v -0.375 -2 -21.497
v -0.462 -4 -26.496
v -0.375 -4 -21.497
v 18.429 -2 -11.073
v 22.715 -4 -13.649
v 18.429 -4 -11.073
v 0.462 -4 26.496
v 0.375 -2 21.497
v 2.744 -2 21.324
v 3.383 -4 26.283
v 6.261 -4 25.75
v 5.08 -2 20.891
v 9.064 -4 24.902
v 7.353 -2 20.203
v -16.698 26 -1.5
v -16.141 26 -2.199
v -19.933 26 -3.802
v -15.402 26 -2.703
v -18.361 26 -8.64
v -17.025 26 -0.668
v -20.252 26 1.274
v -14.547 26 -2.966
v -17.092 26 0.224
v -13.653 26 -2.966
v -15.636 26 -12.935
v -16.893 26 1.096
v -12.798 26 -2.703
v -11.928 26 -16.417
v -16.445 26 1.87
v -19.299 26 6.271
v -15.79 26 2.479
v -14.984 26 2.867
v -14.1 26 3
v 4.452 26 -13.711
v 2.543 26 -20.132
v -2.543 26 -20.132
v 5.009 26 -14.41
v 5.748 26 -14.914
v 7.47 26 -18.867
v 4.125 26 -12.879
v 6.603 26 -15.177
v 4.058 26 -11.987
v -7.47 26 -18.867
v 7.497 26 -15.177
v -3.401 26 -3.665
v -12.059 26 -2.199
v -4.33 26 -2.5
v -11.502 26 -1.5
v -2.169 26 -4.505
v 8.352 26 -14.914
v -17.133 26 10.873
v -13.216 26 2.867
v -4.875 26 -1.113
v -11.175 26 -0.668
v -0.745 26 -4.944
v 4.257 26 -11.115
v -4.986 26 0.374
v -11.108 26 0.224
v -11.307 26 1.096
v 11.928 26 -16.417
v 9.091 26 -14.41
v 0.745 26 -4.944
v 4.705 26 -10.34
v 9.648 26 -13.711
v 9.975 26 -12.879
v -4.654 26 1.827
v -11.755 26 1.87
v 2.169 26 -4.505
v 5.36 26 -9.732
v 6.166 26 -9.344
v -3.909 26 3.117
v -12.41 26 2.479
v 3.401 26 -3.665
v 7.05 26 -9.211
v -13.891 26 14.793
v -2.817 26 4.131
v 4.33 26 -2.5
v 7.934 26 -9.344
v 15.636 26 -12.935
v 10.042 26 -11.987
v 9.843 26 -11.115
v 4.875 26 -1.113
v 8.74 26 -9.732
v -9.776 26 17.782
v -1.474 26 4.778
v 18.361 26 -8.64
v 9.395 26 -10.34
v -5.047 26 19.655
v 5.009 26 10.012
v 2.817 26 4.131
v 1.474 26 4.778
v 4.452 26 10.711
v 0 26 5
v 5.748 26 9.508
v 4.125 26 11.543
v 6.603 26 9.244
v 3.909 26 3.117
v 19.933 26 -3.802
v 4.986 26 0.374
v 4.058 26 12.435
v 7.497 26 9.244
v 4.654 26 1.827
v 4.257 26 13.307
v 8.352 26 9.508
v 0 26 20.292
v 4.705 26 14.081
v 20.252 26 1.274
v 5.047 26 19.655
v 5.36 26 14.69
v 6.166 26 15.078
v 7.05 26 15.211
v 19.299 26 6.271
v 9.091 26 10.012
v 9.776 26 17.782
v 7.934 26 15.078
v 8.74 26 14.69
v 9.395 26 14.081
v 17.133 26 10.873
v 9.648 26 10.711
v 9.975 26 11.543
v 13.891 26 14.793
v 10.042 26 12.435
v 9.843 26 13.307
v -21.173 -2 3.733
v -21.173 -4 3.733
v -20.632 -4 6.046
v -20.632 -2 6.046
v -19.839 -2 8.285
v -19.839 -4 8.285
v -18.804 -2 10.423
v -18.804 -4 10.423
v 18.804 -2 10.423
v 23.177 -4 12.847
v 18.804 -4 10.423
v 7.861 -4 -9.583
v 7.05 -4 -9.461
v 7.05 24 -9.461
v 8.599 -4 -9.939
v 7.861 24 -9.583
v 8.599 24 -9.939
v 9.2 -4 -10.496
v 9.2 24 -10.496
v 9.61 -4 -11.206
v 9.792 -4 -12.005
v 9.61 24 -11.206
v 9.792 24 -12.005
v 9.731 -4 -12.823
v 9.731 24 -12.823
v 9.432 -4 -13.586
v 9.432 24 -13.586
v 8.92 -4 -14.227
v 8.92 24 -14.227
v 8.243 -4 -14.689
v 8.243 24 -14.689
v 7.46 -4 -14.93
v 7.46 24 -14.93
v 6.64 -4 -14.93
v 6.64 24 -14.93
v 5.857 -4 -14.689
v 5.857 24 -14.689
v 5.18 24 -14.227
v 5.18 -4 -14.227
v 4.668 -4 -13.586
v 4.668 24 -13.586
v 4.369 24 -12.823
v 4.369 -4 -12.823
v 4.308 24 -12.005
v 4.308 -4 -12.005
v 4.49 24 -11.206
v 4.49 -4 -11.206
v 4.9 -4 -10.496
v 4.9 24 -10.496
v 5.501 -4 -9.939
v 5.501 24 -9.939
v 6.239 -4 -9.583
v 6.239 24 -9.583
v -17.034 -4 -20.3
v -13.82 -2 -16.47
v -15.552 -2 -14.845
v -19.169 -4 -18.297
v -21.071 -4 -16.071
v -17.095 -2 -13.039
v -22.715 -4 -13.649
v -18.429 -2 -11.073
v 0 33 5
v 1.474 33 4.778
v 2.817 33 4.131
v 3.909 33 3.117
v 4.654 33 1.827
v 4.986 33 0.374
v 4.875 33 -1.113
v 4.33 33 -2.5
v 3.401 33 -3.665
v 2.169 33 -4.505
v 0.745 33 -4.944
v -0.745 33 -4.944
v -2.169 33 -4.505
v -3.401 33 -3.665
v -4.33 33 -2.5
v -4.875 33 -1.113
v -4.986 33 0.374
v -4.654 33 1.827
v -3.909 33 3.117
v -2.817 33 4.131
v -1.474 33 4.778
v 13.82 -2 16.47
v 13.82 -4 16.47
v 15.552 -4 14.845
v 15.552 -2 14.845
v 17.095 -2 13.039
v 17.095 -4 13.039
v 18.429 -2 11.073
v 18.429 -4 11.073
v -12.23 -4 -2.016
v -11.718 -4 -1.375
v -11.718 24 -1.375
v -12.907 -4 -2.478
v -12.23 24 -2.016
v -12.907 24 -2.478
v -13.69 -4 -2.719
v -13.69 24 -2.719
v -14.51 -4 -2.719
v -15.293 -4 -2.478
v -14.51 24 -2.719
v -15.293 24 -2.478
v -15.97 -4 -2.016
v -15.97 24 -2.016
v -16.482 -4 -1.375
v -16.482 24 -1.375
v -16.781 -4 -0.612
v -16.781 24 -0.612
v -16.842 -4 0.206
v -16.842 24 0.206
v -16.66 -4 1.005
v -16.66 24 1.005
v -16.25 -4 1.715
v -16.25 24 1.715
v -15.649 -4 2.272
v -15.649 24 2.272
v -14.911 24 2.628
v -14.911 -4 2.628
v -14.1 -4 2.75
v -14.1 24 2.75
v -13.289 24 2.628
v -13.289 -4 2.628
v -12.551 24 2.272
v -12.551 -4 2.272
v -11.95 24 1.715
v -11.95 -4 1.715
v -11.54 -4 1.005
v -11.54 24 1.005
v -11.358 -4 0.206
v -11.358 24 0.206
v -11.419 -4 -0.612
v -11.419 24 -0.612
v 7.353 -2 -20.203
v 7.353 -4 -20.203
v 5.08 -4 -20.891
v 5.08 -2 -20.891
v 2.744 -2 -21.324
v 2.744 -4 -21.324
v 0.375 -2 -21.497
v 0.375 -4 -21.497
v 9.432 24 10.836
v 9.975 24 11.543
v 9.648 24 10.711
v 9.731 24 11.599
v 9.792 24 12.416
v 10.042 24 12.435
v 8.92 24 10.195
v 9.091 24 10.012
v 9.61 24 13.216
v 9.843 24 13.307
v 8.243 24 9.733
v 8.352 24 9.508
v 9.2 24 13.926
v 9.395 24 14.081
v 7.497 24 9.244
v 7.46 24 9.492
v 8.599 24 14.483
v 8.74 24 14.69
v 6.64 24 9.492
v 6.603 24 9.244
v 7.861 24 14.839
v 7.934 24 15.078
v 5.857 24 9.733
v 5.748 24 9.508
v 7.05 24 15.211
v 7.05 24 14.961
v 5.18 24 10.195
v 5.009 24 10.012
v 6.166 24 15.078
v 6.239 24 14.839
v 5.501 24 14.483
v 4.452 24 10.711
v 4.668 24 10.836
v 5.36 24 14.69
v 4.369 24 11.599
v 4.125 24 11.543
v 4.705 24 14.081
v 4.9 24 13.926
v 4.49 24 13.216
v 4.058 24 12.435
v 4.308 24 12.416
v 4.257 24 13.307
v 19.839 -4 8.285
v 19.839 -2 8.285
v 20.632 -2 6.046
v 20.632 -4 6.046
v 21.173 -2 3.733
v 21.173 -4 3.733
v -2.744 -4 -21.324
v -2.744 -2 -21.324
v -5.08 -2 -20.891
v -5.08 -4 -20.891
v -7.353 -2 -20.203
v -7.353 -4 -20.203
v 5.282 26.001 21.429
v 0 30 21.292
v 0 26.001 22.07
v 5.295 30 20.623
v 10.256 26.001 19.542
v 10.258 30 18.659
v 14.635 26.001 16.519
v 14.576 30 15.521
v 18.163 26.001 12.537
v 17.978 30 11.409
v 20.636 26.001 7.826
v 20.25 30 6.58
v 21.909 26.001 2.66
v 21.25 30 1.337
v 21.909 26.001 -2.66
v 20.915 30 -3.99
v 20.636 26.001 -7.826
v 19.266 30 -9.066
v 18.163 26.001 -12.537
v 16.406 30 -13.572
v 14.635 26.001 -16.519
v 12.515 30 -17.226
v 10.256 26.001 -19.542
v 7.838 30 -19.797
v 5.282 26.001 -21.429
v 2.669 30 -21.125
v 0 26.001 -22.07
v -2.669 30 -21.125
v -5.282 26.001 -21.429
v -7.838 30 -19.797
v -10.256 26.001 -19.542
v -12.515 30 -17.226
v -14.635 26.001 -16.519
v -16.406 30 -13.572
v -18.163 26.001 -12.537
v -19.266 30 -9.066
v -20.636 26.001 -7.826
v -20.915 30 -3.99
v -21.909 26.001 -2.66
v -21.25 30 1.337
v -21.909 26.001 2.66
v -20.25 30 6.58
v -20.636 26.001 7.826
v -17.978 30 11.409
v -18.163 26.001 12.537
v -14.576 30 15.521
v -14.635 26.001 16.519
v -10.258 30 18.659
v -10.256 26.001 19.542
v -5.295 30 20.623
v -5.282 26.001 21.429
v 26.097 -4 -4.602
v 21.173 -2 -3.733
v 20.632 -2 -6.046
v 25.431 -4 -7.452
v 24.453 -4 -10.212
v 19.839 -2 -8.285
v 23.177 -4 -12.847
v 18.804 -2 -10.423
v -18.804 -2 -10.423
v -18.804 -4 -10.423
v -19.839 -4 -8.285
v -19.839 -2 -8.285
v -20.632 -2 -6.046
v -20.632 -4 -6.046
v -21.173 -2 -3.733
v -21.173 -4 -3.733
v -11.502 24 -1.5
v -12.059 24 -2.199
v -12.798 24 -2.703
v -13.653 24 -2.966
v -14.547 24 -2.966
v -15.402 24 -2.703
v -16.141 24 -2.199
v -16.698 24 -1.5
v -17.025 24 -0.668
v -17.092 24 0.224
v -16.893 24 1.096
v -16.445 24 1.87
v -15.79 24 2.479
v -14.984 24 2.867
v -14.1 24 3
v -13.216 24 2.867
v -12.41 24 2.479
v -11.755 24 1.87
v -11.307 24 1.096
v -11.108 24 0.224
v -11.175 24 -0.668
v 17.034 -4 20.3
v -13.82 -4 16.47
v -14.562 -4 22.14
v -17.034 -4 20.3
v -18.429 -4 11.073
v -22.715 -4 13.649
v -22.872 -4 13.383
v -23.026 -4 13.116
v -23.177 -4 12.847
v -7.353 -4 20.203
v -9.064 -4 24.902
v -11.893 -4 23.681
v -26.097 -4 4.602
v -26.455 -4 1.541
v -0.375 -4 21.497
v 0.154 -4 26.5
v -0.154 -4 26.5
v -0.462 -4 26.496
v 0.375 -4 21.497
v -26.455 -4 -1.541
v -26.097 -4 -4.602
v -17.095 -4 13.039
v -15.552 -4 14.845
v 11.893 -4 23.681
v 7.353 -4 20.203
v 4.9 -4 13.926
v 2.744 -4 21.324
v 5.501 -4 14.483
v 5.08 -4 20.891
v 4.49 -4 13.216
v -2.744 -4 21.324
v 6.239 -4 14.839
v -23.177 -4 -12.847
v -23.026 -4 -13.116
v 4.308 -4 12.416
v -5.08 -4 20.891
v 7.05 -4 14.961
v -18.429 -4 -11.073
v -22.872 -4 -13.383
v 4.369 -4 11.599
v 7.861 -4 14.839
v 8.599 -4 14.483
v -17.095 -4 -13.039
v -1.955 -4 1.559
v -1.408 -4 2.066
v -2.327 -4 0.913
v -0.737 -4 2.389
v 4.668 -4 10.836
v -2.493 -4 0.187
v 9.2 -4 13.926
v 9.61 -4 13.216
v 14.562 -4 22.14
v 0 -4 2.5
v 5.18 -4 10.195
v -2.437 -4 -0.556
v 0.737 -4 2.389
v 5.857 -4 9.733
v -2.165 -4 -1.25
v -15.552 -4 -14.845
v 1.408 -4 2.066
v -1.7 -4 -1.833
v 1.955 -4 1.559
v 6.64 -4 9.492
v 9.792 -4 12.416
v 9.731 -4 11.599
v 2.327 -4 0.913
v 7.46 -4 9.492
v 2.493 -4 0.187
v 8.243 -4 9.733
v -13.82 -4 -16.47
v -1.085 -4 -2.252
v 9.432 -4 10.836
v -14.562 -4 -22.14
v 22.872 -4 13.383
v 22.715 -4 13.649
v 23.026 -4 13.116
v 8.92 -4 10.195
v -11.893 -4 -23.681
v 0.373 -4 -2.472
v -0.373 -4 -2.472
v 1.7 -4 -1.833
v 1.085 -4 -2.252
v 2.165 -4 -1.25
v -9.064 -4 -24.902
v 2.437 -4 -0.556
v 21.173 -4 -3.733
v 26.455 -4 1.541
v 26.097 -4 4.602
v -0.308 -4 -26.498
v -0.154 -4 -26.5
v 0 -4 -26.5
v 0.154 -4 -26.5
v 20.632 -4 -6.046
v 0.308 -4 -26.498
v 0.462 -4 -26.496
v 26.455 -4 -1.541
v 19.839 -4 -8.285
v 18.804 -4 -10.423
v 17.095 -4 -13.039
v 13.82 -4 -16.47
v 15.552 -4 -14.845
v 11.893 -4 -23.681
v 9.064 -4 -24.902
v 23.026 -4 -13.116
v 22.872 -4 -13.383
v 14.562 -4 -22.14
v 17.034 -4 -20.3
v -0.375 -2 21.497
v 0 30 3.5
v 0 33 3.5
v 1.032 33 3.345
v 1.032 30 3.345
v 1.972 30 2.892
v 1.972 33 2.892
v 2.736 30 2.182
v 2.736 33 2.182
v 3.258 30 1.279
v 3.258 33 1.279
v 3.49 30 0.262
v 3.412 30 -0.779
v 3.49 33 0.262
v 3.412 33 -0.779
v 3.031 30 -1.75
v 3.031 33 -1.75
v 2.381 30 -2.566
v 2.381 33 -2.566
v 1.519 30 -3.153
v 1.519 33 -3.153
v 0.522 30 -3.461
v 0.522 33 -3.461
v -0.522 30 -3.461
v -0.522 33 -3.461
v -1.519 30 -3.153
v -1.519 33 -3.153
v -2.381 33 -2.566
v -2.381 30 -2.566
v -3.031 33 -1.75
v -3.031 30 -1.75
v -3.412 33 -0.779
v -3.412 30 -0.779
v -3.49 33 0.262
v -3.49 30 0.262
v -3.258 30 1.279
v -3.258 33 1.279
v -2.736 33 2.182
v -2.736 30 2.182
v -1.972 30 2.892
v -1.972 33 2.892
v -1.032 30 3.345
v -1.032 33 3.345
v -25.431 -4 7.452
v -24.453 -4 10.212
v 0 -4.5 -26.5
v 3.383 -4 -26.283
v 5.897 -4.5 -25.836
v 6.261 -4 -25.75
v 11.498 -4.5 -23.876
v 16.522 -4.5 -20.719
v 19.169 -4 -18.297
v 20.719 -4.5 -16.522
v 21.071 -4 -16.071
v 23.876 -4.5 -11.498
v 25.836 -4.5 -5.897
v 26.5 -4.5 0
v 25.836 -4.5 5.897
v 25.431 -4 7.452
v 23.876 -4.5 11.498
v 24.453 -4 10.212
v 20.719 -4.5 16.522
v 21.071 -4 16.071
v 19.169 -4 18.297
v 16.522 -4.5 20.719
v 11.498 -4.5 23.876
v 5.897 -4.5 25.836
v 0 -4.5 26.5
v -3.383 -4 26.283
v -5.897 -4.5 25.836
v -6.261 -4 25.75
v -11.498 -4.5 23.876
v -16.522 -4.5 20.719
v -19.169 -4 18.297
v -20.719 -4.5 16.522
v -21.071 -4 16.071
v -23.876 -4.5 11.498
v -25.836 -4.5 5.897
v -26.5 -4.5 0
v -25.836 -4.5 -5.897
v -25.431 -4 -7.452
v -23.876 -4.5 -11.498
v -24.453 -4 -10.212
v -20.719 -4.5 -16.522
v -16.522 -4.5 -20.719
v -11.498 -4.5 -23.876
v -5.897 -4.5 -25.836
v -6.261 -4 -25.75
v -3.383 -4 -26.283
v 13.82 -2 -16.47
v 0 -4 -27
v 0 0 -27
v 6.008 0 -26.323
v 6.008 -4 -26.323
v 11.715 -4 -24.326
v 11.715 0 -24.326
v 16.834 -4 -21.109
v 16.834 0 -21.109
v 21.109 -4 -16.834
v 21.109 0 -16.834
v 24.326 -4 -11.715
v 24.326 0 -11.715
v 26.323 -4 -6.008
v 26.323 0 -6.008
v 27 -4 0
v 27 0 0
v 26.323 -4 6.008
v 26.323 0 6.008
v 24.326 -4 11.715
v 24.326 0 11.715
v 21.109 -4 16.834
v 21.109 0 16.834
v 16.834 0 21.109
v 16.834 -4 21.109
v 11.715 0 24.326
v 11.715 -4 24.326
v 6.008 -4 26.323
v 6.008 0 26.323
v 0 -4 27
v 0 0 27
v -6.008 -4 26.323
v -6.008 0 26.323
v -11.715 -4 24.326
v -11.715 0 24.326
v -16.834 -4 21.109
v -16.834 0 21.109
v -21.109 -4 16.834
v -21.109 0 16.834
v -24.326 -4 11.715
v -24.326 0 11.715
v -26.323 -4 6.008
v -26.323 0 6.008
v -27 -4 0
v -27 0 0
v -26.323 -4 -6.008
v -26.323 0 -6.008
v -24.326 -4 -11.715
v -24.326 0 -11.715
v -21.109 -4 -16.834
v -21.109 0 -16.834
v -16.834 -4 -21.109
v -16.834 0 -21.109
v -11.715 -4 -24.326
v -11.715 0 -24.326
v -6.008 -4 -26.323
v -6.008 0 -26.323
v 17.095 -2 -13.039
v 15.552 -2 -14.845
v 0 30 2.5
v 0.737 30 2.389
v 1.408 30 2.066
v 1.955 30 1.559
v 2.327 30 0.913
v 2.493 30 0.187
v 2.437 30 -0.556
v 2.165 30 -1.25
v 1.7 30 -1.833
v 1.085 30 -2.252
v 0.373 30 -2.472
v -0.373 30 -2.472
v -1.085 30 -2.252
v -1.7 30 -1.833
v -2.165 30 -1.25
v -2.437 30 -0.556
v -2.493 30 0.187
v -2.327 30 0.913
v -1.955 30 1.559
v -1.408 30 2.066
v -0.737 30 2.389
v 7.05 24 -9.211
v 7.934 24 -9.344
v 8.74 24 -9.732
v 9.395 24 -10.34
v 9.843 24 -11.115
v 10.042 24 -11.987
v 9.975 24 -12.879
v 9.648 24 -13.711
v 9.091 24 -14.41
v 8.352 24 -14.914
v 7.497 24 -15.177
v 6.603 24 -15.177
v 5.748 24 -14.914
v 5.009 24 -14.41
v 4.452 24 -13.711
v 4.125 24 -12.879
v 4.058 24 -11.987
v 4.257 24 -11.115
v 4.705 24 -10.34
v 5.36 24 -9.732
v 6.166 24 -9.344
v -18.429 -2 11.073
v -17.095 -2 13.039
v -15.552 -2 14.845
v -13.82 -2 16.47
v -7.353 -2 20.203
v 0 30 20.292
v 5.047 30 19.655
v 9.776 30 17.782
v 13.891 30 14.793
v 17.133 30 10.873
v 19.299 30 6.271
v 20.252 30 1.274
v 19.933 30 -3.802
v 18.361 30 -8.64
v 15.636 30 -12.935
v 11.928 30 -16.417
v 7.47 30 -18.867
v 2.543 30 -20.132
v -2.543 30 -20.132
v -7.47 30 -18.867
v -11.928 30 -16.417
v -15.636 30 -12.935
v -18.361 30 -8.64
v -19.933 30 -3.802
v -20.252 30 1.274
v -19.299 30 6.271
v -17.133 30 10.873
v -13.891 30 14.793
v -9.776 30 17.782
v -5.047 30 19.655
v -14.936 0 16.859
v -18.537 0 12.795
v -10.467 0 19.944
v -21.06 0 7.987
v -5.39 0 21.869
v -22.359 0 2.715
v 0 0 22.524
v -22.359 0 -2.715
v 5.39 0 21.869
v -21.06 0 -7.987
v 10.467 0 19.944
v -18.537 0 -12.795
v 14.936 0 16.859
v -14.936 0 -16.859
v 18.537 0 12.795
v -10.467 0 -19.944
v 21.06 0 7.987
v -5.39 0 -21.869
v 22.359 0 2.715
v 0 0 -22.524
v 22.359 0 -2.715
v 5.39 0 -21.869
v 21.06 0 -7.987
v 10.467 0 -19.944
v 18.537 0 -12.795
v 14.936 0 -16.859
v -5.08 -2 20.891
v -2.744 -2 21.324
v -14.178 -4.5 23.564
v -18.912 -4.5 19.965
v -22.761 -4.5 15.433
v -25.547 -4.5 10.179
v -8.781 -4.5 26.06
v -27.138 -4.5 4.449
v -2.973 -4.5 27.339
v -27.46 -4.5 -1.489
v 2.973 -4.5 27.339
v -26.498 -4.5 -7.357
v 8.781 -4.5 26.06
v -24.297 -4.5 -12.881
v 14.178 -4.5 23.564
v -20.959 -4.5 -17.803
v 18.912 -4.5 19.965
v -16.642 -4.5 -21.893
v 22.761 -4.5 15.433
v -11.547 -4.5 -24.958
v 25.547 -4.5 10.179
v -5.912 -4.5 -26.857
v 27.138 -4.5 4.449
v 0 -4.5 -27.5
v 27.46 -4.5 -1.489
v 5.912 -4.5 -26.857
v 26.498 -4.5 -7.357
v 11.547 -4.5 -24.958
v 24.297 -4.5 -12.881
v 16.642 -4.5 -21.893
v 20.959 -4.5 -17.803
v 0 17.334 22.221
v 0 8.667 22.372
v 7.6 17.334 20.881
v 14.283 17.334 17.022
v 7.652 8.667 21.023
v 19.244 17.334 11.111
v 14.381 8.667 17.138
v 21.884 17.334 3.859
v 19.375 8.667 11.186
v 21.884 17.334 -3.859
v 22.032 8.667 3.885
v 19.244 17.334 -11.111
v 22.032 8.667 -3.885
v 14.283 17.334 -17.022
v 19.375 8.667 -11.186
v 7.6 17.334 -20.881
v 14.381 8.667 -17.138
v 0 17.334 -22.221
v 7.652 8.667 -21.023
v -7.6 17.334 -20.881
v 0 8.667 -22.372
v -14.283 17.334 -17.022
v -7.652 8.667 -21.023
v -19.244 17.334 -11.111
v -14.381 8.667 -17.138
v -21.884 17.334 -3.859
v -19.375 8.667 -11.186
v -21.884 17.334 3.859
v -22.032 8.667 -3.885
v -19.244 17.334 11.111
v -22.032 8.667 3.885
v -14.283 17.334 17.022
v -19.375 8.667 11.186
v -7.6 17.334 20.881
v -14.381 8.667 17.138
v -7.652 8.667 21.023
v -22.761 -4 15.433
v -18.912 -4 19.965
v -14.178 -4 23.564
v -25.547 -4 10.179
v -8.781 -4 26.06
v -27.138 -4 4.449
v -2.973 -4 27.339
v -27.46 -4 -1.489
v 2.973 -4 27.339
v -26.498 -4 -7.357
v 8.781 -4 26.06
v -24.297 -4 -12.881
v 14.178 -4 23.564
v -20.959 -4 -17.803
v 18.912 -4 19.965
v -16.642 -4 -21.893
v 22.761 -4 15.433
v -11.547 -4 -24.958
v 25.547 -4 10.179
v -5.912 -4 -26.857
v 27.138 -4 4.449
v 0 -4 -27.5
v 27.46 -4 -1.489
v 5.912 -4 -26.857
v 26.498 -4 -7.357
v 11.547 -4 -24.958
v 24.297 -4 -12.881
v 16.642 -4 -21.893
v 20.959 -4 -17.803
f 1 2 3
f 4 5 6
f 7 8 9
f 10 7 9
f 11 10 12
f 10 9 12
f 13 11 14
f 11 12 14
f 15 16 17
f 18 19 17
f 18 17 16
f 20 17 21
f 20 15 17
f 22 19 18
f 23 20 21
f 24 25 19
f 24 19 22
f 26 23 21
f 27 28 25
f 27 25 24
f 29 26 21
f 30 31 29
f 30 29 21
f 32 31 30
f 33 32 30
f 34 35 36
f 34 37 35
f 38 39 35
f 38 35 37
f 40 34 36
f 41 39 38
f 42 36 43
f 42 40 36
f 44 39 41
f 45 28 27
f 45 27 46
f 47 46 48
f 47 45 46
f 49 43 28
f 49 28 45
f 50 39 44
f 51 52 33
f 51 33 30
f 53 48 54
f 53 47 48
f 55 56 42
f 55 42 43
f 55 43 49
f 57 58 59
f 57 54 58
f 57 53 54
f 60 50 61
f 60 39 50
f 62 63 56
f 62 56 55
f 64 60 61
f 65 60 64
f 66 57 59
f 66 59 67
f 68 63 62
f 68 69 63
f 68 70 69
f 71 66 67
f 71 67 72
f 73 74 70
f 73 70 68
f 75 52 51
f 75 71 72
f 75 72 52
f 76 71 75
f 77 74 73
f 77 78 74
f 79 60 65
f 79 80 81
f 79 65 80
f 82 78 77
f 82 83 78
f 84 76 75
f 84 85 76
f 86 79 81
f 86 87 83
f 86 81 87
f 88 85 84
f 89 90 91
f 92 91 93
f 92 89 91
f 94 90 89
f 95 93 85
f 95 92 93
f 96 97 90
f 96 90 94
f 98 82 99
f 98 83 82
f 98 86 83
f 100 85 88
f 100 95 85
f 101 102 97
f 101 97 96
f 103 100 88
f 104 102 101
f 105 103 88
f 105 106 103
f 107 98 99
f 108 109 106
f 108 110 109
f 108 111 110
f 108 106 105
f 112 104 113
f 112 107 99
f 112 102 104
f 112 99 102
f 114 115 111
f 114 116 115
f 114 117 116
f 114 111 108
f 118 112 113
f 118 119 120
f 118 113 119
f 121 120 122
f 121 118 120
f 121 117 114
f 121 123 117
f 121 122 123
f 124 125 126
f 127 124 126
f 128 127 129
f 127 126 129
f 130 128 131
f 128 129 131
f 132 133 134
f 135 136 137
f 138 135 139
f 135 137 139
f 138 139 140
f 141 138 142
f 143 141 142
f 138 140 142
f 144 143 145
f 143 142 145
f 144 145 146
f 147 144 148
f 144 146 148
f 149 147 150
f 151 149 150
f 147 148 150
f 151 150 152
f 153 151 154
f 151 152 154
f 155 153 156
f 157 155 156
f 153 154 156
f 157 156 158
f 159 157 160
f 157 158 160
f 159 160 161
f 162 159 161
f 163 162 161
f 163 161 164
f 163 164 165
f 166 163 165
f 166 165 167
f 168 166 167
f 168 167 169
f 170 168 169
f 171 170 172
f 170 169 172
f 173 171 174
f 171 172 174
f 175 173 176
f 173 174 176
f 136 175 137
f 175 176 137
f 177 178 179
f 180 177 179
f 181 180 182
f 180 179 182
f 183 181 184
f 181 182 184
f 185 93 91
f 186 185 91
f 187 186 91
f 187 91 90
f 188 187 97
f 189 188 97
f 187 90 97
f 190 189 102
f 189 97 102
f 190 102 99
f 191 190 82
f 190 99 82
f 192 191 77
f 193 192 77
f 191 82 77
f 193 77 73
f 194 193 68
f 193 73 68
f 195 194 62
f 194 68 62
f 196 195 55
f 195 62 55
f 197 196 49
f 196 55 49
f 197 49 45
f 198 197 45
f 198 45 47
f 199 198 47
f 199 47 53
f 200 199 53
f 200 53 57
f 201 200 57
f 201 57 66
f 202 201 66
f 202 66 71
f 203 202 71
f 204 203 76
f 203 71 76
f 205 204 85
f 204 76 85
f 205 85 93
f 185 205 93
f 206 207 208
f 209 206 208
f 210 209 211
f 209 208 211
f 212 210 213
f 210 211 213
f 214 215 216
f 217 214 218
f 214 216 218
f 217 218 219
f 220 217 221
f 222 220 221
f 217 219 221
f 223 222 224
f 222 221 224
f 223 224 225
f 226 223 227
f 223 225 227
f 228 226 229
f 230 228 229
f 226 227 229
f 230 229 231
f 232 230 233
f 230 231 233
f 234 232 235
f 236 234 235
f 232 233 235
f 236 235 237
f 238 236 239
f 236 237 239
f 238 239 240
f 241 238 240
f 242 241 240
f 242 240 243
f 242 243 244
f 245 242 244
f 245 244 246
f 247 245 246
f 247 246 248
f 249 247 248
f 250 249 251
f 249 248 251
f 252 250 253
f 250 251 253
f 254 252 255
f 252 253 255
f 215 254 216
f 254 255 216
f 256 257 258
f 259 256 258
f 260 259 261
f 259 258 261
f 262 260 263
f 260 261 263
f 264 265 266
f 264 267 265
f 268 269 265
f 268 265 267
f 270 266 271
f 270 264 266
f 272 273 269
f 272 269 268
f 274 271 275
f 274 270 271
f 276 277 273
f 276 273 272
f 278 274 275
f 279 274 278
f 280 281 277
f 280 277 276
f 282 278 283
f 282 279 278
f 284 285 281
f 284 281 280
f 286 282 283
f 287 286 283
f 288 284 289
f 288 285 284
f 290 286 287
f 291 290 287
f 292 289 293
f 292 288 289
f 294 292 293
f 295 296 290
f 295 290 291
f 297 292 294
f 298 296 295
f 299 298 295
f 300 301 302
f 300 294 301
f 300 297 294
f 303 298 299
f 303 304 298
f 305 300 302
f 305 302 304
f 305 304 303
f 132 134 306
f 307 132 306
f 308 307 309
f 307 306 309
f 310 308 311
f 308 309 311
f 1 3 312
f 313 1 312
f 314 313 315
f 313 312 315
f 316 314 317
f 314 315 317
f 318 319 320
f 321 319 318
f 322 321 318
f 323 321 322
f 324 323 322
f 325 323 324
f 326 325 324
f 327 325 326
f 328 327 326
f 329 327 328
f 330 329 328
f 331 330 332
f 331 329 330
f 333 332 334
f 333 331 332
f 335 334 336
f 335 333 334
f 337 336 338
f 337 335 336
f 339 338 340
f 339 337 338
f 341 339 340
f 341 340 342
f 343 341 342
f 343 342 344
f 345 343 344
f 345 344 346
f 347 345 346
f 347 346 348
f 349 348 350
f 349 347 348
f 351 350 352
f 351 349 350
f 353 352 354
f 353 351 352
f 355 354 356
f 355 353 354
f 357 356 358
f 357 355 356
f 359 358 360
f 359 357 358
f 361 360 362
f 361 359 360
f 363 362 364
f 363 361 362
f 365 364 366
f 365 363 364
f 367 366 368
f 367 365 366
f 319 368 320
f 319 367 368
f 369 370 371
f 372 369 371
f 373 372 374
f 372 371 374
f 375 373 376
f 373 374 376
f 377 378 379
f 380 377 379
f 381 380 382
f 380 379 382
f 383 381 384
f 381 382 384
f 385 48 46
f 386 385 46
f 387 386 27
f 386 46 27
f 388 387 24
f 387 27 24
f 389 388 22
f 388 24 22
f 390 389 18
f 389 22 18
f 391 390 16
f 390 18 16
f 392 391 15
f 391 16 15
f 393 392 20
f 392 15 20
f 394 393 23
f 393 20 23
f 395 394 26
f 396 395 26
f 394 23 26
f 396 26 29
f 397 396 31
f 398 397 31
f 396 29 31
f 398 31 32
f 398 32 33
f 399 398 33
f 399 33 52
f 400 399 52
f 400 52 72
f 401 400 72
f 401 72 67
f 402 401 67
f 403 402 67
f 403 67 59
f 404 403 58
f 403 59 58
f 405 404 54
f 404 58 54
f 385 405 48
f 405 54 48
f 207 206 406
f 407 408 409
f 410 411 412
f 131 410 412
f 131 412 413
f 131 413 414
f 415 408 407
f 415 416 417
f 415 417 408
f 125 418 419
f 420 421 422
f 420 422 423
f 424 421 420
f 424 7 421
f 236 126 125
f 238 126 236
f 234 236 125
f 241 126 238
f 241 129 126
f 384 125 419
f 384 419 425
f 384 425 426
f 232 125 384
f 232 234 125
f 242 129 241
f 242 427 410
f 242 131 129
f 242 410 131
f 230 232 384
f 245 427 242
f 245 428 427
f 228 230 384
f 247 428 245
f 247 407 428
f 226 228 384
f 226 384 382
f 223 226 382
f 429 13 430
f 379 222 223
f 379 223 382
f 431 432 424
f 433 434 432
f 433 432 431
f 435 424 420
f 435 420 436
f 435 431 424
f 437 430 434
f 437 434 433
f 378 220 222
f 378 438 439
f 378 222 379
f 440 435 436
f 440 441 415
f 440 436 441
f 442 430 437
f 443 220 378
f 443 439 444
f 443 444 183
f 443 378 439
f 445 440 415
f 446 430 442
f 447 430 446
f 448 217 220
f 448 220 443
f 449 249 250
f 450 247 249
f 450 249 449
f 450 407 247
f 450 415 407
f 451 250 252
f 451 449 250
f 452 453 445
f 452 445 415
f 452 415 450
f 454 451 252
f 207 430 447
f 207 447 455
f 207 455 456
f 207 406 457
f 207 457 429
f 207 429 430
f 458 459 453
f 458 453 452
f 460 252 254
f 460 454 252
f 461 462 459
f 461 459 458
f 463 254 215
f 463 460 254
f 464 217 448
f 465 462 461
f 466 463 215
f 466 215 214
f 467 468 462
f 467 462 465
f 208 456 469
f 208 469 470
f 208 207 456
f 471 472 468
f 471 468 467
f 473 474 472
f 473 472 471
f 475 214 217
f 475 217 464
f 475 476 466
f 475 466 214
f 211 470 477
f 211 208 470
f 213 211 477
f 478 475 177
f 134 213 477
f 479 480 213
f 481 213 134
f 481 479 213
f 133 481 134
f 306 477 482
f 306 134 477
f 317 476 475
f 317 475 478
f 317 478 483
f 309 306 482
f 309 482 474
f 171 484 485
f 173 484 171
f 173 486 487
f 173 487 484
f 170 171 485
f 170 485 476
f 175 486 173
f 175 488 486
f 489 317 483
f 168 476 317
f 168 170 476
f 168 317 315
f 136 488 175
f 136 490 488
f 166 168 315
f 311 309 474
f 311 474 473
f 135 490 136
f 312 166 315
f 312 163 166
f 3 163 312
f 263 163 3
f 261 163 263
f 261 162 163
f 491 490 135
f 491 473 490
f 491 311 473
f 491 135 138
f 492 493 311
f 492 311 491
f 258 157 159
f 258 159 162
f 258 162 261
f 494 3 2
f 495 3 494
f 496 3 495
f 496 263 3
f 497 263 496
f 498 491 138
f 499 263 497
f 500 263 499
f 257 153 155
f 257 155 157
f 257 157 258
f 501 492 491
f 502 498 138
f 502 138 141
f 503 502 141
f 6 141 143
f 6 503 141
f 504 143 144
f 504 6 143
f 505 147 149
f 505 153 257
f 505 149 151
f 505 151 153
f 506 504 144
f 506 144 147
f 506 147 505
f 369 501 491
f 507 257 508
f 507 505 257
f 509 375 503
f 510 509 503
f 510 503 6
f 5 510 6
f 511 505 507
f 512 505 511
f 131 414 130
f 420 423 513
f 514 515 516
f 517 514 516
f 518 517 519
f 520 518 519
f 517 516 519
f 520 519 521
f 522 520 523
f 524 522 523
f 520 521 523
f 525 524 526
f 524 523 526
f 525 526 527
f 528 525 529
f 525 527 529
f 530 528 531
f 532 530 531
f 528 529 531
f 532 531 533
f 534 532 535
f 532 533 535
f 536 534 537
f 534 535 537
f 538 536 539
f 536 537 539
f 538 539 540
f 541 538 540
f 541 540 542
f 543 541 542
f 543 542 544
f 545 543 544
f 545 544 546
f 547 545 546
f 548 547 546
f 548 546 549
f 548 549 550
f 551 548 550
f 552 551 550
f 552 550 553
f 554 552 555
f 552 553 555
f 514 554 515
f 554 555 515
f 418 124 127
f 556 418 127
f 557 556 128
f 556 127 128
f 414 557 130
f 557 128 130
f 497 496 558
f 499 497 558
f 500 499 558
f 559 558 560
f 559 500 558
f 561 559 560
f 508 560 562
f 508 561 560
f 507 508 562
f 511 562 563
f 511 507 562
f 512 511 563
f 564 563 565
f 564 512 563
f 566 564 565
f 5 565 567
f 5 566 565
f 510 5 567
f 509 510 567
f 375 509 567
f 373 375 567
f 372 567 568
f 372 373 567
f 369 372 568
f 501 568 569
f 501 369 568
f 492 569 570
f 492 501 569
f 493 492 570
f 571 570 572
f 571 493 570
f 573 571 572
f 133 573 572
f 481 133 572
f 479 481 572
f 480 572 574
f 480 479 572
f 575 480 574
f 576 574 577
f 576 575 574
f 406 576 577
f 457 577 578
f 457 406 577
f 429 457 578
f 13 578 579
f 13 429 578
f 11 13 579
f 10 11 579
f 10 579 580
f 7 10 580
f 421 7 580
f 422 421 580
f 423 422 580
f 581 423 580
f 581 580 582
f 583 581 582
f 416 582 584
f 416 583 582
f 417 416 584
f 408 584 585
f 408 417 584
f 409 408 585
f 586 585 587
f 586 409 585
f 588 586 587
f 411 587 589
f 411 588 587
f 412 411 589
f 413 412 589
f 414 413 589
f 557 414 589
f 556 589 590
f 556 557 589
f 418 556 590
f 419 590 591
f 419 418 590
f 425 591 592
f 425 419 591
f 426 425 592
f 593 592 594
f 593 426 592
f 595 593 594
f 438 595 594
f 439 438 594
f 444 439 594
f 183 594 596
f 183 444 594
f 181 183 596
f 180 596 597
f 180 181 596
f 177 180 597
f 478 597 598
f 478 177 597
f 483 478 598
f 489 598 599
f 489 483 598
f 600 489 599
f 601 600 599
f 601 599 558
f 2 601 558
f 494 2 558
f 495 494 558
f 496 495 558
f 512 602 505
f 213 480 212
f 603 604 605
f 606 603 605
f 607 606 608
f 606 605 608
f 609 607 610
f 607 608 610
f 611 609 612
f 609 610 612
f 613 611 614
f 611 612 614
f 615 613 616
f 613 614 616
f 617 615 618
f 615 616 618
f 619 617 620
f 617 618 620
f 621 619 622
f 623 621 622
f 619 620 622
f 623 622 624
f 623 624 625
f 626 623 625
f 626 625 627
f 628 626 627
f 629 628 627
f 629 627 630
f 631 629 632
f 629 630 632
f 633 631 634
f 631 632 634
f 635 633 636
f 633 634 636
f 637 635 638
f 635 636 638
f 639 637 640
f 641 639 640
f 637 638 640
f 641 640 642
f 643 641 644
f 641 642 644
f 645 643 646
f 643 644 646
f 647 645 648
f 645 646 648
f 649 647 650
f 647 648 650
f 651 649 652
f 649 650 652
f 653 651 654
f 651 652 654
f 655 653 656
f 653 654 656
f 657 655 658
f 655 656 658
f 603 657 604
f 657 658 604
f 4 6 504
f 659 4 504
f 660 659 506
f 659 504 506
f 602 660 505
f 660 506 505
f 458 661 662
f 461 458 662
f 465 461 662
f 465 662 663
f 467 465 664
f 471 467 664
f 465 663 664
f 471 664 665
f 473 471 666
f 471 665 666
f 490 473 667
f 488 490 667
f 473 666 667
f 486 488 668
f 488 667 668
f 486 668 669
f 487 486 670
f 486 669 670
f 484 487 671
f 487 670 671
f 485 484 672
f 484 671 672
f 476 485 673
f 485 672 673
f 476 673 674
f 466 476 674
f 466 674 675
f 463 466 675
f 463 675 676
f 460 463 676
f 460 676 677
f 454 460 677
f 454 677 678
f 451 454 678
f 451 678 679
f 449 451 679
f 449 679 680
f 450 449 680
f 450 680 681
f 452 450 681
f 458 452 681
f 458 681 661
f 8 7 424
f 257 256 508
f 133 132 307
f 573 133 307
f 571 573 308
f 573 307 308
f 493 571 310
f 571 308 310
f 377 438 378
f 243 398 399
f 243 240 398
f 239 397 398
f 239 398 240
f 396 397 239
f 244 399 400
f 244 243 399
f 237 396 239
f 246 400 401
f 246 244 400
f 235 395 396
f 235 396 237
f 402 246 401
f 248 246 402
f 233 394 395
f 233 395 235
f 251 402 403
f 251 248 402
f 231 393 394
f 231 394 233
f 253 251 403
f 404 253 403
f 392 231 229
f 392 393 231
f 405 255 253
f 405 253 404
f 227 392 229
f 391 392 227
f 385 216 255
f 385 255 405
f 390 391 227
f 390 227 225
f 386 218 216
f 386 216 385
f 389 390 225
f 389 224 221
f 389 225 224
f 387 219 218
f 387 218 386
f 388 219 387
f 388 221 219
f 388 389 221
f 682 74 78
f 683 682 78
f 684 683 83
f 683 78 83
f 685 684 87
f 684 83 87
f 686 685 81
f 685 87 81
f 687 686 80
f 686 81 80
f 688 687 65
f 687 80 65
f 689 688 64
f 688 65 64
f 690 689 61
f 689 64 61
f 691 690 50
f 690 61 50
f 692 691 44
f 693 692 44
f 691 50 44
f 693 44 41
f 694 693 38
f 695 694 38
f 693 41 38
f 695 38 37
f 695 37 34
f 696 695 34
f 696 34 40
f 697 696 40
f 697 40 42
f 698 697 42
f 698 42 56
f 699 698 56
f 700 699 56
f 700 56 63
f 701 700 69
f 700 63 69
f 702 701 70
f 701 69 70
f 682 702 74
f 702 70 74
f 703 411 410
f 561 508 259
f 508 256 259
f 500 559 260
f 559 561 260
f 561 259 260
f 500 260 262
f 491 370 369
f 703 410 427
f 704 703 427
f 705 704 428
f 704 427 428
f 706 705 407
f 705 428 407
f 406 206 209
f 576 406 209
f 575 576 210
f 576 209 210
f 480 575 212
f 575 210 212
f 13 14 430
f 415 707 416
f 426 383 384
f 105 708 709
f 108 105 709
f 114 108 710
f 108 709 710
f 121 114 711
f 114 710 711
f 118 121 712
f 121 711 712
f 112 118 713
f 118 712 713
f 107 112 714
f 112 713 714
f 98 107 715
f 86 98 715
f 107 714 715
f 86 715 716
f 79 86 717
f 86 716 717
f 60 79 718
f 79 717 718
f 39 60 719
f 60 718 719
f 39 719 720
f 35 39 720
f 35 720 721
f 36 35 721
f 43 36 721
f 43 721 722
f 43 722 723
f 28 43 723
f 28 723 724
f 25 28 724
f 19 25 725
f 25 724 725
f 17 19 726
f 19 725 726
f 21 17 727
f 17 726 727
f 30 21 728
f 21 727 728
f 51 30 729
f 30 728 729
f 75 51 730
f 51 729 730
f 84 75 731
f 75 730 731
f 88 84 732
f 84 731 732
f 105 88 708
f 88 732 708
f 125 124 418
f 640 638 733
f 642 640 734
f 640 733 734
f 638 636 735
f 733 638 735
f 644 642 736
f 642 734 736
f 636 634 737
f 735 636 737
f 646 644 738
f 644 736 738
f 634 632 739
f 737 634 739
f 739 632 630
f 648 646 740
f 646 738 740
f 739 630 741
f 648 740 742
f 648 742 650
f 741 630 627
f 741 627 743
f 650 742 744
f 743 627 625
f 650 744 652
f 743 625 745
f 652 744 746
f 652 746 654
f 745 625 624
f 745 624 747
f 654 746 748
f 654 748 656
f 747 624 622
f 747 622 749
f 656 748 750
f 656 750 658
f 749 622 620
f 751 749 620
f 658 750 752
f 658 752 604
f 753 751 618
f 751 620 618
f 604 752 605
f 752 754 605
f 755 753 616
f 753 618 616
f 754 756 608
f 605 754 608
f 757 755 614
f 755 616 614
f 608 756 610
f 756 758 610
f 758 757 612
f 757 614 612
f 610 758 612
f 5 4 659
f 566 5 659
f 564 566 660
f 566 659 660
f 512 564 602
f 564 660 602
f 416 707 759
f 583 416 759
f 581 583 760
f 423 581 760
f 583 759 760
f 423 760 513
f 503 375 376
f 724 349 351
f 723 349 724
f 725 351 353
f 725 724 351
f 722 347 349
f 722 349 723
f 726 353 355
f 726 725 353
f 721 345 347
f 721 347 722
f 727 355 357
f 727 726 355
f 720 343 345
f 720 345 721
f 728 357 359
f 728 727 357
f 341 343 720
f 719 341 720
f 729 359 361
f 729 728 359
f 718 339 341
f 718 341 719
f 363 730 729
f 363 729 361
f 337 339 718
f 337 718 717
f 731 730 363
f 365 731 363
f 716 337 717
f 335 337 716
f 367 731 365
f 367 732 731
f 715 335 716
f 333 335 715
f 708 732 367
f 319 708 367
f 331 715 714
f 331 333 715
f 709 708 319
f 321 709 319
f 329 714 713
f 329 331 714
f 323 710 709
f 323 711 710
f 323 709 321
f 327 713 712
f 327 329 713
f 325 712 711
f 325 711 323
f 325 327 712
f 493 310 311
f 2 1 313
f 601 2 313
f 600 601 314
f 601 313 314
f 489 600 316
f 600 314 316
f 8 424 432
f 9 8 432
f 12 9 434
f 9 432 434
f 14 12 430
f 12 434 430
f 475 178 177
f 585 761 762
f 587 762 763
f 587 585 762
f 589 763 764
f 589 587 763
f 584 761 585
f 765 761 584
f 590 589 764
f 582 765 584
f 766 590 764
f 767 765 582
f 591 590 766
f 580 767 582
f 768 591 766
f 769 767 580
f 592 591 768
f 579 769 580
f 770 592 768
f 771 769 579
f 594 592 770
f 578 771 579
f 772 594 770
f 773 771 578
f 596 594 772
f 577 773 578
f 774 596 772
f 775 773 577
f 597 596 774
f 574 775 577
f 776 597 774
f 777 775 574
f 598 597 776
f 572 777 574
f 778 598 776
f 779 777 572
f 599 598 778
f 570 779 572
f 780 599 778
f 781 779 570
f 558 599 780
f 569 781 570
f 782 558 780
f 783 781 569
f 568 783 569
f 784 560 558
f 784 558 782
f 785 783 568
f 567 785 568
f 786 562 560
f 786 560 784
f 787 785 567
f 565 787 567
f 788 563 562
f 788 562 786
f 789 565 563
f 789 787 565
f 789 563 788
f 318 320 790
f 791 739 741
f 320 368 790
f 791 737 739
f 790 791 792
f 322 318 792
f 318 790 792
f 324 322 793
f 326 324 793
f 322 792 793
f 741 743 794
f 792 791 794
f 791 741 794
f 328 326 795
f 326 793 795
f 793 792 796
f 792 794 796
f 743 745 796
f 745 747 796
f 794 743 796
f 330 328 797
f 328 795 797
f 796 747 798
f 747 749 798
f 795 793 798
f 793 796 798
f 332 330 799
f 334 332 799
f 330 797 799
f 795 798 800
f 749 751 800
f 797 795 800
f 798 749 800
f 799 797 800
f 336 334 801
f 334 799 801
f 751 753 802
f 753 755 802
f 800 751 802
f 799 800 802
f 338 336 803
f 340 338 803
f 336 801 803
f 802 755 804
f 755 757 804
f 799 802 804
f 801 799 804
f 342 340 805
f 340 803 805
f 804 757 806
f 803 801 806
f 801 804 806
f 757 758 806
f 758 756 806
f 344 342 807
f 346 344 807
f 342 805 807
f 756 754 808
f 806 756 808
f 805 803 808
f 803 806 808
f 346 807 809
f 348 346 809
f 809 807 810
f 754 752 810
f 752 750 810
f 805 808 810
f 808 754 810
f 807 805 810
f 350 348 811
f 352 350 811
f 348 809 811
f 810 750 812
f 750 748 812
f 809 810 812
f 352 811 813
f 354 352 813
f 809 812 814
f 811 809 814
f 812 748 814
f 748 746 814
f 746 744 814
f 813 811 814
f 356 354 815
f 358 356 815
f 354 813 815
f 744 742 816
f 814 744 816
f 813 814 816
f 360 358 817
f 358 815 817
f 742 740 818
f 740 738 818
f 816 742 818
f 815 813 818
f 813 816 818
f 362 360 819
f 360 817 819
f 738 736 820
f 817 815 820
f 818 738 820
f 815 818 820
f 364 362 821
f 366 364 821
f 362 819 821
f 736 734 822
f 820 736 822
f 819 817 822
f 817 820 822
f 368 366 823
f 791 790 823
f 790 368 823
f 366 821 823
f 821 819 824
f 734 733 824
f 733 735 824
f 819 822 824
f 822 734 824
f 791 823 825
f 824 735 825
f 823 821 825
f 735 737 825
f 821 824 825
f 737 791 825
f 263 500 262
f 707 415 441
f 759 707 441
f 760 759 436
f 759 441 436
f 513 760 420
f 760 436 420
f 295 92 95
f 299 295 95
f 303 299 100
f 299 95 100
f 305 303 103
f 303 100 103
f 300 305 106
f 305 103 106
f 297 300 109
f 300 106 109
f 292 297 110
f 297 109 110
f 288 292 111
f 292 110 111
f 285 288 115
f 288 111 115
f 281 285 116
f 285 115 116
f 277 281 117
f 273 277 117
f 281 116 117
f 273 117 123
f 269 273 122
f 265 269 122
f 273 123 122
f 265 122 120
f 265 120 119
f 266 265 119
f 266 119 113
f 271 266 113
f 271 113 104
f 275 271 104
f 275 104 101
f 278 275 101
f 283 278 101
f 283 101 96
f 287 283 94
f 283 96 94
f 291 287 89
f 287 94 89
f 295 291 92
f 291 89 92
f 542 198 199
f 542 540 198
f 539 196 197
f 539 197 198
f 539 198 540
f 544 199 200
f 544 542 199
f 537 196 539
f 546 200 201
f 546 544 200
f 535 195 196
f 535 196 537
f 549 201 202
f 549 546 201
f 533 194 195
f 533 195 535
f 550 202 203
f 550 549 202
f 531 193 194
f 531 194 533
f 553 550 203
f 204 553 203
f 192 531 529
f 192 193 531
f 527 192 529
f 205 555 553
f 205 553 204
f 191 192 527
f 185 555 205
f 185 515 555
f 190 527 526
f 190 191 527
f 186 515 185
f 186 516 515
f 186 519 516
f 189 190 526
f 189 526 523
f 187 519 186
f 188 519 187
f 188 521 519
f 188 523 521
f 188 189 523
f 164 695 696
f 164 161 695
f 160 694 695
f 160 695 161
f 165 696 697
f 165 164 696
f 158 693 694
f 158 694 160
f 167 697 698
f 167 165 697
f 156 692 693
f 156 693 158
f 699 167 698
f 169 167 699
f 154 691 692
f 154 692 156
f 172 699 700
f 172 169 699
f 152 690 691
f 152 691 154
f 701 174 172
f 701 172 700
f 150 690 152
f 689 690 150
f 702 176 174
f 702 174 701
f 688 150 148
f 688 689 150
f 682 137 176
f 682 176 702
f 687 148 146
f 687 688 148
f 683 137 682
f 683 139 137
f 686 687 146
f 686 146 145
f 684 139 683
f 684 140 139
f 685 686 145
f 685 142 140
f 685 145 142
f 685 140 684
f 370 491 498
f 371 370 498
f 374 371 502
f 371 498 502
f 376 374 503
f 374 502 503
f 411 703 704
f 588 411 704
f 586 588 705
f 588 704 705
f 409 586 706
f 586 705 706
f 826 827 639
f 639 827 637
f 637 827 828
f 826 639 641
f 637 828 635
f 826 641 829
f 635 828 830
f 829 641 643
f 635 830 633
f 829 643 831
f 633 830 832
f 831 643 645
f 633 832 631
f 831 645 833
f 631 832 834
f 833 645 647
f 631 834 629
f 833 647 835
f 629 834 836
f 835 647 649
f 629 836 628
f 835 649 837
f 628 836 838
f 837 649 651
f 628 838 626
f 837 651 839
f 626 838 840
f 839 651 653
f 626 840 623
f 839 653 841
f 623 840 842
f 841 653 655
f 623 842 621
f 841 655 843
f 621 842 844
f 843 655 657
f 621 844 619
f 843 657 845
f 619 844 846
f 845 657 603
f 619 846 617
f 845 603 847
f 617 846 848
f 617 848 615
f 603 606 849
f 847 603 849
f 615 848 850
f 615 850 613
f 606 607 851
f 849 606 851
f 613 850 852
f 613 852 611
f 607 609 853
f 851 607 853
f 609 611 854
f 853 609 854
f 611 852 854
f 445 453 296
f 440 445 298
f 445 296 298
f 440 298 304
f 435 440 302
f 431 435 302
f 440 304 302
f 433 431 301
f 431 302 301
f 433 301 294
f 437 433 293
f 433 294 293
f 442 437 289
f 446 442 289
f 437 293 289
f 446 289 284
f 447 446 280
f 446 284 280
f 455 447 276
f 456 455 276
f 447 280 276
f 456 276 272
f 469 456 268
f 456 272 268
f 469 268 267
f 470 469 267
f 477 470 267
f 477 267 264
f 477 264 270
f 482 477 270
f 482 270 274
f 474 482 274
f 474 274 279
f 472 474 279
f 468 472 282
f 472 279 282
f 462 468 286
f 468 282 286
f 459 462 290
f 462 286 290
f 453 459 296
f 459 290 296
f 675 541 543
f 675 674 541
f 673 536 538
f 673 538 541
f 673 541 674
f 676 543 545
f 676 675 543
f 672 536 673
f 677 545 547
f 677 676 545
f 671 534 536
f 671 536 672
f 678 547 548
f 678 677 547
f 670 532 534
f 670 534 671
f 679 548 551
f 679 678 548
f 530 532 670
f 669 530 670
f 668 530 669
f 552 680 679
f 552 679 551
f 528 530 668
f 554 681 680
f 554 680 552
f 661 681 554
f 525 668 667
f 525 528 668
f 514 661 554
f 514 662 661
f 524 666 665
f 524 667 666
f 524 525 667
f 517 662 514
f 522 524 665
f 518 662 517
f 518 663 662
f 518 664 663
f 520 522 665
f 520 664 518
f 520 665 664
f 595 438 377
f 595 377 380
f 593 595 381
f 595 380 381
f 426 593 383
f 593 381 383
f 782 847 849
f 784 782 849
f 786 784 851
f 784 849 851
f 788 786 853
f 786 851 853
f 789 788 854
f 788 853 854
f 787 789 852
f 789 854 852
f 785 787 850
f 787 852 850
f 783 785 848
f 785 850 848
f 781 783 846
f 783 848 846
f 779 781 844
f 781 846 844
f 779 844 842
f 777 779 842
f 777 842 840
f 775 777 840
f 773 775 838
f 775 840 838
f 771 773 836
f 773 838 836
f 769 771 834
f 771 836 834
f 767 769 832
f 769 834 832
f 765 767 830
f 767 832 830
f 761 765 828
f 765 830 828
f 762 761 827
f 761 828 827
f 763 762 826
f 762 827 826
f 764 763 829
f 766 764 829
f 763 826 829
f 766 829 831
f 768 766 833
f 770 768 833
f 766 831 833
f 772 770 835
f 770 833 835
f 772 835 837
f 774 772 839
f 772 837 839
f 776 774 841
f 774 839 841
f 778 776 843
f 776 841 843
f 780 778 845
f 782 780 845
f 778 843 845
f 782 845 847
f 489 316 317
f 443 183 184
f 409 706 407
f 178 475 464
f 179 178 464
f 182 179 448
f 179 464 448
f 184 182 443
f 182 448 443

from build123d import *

# Parameters (mm, degrees)
SCHIZZO1_R                    = 22
ESTRUSIONE_ESTRUSIONE1_DEPTH  = 30
SFORMO1_ANGLE                 = 1
SMUSSO1_SIZE                  = 4
SMUSSO1_SIZE2                 = 0.707593191
SCHIZZO2_R                    = 20.292406809
TAGLIO_ESTRUSIONE1_DEPTH      = 4
SCHIZZO4_R                    = 3
TAGLIO_ESTRUSIONE2_DEPTH      = 2
SCHIZZO3_R                    = 5
ESTRUSIONE_ESTRUSIONE2_DEPTH  = 7
SCHIZZO6_R                    = 3.5
TAGLIO_ESTRUSIONE5_DEPTH      = 3
SCHIZZO14_R                   = 27
SCHIZZO14_R_2                 = 22.5
ESTRUSIONE_ESTRUSIONE8_DEPTH  = 4
SCHIZZO16_R                   = 27.5
SCHIZZO16_R_2                 = 26.5
ESTRUSIONE_ESTRUSIONE9_DEPTH  = 0.5
SCHIZZO21_R                   = 22.5
ESTRUSIONE_ESTRUSIONE12_DEPTH = 4
SCHIZZO5_R                    = 2.75
TAGLIO_ESTRUSIONE3_DEPTH      = 49.215661356
RIPETIZIONECIRCOLARE1_COUNT   = 3
SCHIZZO24_R                   = 2.5
TAGLIO_ESTRUSIONE11_DEPTH     = 52.98797938
TAGLIA_RIVOLUZIONE1_ANGLE     = 40
RIVOLUZIONE1_ANGLE            = 2
RIPETIZIONECIRCOLARE2_COUNT   = 6


# Read off the part's stored shape, not the designer's step: Taglia-Rivoluzione1
with BuildPart() as part:
    # Schizzo1 → Estrusione-Estrusione1 (new body)
    with BuildSketch(Plane(origin=(0, 0, 0), x_dir=(1, 0, 0), z_dir=(0, 1, 0))):
        with Locations(Location((0, 0, 0), (0, 0, 270))):
            Circle(SCHIZZO1_R)
    extrude(amount=ESTRUSIONE_ESTRUSIONE1_DEPTH)

    # Sformo1
    sformo1_faces = [part.faces().sort_by_distance(p)[0] for p in [
        (0, 15, -22),
    ]]
    draft(sformo1_faces, Plane.ZX.offset(30), SFORMO1_ANGLE)

    # Smusso1
    smusso1_edges = [part.edges().sort_by_distance(p)[0] for p in [
        (0, 30, -22),
    ]]
    smusso1_side = [part.faces().sort_by_distance(p)[0] for p in [
        (0, 15, -22.261825974),
    ]]
    chamfer(smusso1_edges, length=SMUSSO1_SIZE, length2=SMUSSO1_SIZE2, reference=smusso1_side[0])

    # Schizzo2 → Taglio-Estrusione1 (cut)
    with BuildSketch(Plane(origin=(0, 30, 0), x_dir=(1, 0, 0), z_dir=(0, 1, 0))):
        with Locations(Location((0, 0, 0), (0, 0, 270))):
            Circle(SCHIZZO2_R)
    extrude(amount=-TAGLIO_ESTRUSIONE1_DEPTH, mode=Mode.SUBTRACT)

    # Schizzo4 → Taglio-Estrusione2 (cut)
    with BuildSketch(Plane(origin=(0, 26, 0), x_dir=(1, 0, 0), z_dir=(0, 1, 0))):
        with Locations(Location((7.05, 12.210958193, 0), (0, 0, 270))):
            Circle(SCHIZZO4_R)
    taglio_estrusione2 = extrude(amount=-TAGLIO_ESTRUSIONE2_DEPTH, mode=Mode.SUBTRACT)

    # Schizzo3 → Estrusione-Estrusione2 (add)
    with BuildSketch(Plane(origin=(0, 26, 0), x_dir=(1, 0, 0), z_dir=(0, 1, 0))):
        with Locations(Location((0, 0, 0), (0, 0, 270))):
            Circle(SCHIZZO3_R)
    extrude(amount=ESTRUSIONE_ESTRUSIONE2_DEPTH)

    # Schizzo6 → Taglio-Estrusione5 (cut)
    with BuildSketch(Plane(origin=(0, 33, 0), x_dir=(1, 0, 0), z_dir=(0, 1, 0))):
        with Locations(Location((0, 0, 0), (0, 0, 270))):
            Circle(SCHIZZO6_R)
    extrude(amount=-TAGLIO_ESTRUSIONE5_DEPTH, mode=Mode.SUBTRACT)

    # Schizzo14 → Estrusione-Estrusione8 (add)
    with BuildSketch(Plane.XZ):
        with Locations(Location((0, 0, 0), (0, 0, 270))):
            Circle(SCHIZZO14_R)
        with Locations(Location((0, 0, 0), (0, 0, 270))):
            Circle(SCHIZZO14_R_2, mode=Mode.SUBTRACT)
    extrude(amount=ESTRUSIONE_ESTRUSIONE8_DEPTH)

    # Schizzo16 → Estrusione-Estrusione9 (add)
    with BuildSketch(Plane.XZ.offset(4)):
        with Locations(Location((0, 0, 0), (0, 0, 270))):
            Circle(SCHIZZO16_R)
        with Locations(Location((0, 0, 0), (0, 0, 270))):
            Circle(SCHIZZO16_R_2, mode=Mode.SUBTRACT)
    extrude(amount=ESTRUSIONE_ESTRUSIONE9_DEPTH)

    # Schizzo21 → Estrusione-Estrusione12 (add)
    with BuildSketch(Plane.XZ):
        Circle(SCHIZZO21_R)
    extrude(amount=ESTRUSIONE_ESTRUSIONE12_DEPTH)

    # Schizzo5 → Taglio-Estrusione3 (cut, symmetric)
    with BuildSketch(Plane(origin=(0, 24, 0), x_dir=(1, 0, 0), z_dir=(0, 1, 0))):
        with Locations(Location((7.05, 12.210958193, 0), (0, 0, 270))):
            Circle(SCHIZZO5_R)
    taglio_estrusione3 = extrude(amount=TAGLIO_ESTRUSIONE3_DEPTH, both=True, mode=Mode.SUBTRACT)

    # RipetizioneCircolare1: Taglio-Estrusione2, Taglio-Estrusione3 ×3 about axis
    ripetizionecircolare1_axis = Axis((0, 0, 0), (0, 1, 0))
    add([taglio_estrusione2.rotate(ripetizionecircolare1_axis, i * 360 / RIPETIZIONECIRCOLARE1_COUNT) for i in range(1, RIPETIZIONECIRCOLARE1_COUNT)], mode=Mode.SUBTRACT)
    add([taglio_estrusione3.rotate(ripetizionecircolare1_axis, i * 360 / RIPETIZIONECIRCOLARE1_COUNT) for i in range(1, RIPETIZIONECIRCOLARE1_COUNT)], mode=Mode.SUBTRACT)

    # Schizzo24 → Taglio-Estrusione11 (cut, through all)
    with BuildSketch(Plane(origin=(0, 30, 0), x_dir=(1, 0, 0), z_dir=(0, 1, 0))):
        with Locations(Location((0, 0, 0), (0, 0, 270))):
            Circle(SCHIZZO24_R)
    extrude(amount=-TAGLIO_ESTRUSIONE11_DEPTH, mode=Mode.SUBTRACT)

    # Taglia-Rivoluzione1 outline → Taglia-Rivoluzione1 (revolve, cut)
    with BuildSketch(Plane(origin=(0, 0, 0), x_dir=(0.3420201433256628, 0, -0.9396926207859105), z_dir=(0.9396926207859105, 0, 0.3420201433256628))):
        Polygon((26.5, -4), (21.5, -2), (21.5, -4), align=None)
    taglia_rivoluzione1 = revolve(axis=Axis((0, 0, 0), (0, 1, 0)), revolution_arc=TAGLIA_RIVOLUZIONE1_ANGLE, mode=Mode.SUBTRACT)

    # Schizzo28 → Rivoluzione1 (revolve, symmetric)
    with BuildSketch(Plane(origin=(0, 0, 0), x_dir=(0, 0, -1), z_dir=(1, 0, 0))) as rivoluzione1_sk:
        Polygon((21.5, -4), (21.5, -2), (26.5, -4), align=None)
    rivoluzione1 = revolve(axis=Axis((0, -4.5, 0), (0, 1, 0)), revolution_arc=RIVOLUZIONE1_ANGLE / 2)
    rivoluzione1 = rivoluzione1 + revolve(rivoluzione1_sk.sketch, axis=Axis((0, -4.5, 0), (0, -1, 0)), revolution_arc=RIVOLUZIONE1_ANGLE / 2)

    # RipetizioneCircolare2: Taglia-Rivoluzione1, Rivoluzione1 ×6 about axis
    ripetizionecircolare2_axis = Axis((0, 0, 0), (0, 1, 0))
    add([taglia_rivoluzione1.rotate(ripetizionecircolare2_axis, i * 360 / RIPETIZIONECIRCOLARE2_COUNT) for i in range(1, RIPETIZIONECIRCOLARE2_COUNT)], mode=Mode.SUBTRACT)
    add([rivoluzione1.rotate(ripetizionecircolare2_axis, i * 360 / RIPETIZIONECIRCOLARE2_COUNT) for i in range(1, RIPETIZIONECIRCOLARE2_COUNT)])


solid = part.part
